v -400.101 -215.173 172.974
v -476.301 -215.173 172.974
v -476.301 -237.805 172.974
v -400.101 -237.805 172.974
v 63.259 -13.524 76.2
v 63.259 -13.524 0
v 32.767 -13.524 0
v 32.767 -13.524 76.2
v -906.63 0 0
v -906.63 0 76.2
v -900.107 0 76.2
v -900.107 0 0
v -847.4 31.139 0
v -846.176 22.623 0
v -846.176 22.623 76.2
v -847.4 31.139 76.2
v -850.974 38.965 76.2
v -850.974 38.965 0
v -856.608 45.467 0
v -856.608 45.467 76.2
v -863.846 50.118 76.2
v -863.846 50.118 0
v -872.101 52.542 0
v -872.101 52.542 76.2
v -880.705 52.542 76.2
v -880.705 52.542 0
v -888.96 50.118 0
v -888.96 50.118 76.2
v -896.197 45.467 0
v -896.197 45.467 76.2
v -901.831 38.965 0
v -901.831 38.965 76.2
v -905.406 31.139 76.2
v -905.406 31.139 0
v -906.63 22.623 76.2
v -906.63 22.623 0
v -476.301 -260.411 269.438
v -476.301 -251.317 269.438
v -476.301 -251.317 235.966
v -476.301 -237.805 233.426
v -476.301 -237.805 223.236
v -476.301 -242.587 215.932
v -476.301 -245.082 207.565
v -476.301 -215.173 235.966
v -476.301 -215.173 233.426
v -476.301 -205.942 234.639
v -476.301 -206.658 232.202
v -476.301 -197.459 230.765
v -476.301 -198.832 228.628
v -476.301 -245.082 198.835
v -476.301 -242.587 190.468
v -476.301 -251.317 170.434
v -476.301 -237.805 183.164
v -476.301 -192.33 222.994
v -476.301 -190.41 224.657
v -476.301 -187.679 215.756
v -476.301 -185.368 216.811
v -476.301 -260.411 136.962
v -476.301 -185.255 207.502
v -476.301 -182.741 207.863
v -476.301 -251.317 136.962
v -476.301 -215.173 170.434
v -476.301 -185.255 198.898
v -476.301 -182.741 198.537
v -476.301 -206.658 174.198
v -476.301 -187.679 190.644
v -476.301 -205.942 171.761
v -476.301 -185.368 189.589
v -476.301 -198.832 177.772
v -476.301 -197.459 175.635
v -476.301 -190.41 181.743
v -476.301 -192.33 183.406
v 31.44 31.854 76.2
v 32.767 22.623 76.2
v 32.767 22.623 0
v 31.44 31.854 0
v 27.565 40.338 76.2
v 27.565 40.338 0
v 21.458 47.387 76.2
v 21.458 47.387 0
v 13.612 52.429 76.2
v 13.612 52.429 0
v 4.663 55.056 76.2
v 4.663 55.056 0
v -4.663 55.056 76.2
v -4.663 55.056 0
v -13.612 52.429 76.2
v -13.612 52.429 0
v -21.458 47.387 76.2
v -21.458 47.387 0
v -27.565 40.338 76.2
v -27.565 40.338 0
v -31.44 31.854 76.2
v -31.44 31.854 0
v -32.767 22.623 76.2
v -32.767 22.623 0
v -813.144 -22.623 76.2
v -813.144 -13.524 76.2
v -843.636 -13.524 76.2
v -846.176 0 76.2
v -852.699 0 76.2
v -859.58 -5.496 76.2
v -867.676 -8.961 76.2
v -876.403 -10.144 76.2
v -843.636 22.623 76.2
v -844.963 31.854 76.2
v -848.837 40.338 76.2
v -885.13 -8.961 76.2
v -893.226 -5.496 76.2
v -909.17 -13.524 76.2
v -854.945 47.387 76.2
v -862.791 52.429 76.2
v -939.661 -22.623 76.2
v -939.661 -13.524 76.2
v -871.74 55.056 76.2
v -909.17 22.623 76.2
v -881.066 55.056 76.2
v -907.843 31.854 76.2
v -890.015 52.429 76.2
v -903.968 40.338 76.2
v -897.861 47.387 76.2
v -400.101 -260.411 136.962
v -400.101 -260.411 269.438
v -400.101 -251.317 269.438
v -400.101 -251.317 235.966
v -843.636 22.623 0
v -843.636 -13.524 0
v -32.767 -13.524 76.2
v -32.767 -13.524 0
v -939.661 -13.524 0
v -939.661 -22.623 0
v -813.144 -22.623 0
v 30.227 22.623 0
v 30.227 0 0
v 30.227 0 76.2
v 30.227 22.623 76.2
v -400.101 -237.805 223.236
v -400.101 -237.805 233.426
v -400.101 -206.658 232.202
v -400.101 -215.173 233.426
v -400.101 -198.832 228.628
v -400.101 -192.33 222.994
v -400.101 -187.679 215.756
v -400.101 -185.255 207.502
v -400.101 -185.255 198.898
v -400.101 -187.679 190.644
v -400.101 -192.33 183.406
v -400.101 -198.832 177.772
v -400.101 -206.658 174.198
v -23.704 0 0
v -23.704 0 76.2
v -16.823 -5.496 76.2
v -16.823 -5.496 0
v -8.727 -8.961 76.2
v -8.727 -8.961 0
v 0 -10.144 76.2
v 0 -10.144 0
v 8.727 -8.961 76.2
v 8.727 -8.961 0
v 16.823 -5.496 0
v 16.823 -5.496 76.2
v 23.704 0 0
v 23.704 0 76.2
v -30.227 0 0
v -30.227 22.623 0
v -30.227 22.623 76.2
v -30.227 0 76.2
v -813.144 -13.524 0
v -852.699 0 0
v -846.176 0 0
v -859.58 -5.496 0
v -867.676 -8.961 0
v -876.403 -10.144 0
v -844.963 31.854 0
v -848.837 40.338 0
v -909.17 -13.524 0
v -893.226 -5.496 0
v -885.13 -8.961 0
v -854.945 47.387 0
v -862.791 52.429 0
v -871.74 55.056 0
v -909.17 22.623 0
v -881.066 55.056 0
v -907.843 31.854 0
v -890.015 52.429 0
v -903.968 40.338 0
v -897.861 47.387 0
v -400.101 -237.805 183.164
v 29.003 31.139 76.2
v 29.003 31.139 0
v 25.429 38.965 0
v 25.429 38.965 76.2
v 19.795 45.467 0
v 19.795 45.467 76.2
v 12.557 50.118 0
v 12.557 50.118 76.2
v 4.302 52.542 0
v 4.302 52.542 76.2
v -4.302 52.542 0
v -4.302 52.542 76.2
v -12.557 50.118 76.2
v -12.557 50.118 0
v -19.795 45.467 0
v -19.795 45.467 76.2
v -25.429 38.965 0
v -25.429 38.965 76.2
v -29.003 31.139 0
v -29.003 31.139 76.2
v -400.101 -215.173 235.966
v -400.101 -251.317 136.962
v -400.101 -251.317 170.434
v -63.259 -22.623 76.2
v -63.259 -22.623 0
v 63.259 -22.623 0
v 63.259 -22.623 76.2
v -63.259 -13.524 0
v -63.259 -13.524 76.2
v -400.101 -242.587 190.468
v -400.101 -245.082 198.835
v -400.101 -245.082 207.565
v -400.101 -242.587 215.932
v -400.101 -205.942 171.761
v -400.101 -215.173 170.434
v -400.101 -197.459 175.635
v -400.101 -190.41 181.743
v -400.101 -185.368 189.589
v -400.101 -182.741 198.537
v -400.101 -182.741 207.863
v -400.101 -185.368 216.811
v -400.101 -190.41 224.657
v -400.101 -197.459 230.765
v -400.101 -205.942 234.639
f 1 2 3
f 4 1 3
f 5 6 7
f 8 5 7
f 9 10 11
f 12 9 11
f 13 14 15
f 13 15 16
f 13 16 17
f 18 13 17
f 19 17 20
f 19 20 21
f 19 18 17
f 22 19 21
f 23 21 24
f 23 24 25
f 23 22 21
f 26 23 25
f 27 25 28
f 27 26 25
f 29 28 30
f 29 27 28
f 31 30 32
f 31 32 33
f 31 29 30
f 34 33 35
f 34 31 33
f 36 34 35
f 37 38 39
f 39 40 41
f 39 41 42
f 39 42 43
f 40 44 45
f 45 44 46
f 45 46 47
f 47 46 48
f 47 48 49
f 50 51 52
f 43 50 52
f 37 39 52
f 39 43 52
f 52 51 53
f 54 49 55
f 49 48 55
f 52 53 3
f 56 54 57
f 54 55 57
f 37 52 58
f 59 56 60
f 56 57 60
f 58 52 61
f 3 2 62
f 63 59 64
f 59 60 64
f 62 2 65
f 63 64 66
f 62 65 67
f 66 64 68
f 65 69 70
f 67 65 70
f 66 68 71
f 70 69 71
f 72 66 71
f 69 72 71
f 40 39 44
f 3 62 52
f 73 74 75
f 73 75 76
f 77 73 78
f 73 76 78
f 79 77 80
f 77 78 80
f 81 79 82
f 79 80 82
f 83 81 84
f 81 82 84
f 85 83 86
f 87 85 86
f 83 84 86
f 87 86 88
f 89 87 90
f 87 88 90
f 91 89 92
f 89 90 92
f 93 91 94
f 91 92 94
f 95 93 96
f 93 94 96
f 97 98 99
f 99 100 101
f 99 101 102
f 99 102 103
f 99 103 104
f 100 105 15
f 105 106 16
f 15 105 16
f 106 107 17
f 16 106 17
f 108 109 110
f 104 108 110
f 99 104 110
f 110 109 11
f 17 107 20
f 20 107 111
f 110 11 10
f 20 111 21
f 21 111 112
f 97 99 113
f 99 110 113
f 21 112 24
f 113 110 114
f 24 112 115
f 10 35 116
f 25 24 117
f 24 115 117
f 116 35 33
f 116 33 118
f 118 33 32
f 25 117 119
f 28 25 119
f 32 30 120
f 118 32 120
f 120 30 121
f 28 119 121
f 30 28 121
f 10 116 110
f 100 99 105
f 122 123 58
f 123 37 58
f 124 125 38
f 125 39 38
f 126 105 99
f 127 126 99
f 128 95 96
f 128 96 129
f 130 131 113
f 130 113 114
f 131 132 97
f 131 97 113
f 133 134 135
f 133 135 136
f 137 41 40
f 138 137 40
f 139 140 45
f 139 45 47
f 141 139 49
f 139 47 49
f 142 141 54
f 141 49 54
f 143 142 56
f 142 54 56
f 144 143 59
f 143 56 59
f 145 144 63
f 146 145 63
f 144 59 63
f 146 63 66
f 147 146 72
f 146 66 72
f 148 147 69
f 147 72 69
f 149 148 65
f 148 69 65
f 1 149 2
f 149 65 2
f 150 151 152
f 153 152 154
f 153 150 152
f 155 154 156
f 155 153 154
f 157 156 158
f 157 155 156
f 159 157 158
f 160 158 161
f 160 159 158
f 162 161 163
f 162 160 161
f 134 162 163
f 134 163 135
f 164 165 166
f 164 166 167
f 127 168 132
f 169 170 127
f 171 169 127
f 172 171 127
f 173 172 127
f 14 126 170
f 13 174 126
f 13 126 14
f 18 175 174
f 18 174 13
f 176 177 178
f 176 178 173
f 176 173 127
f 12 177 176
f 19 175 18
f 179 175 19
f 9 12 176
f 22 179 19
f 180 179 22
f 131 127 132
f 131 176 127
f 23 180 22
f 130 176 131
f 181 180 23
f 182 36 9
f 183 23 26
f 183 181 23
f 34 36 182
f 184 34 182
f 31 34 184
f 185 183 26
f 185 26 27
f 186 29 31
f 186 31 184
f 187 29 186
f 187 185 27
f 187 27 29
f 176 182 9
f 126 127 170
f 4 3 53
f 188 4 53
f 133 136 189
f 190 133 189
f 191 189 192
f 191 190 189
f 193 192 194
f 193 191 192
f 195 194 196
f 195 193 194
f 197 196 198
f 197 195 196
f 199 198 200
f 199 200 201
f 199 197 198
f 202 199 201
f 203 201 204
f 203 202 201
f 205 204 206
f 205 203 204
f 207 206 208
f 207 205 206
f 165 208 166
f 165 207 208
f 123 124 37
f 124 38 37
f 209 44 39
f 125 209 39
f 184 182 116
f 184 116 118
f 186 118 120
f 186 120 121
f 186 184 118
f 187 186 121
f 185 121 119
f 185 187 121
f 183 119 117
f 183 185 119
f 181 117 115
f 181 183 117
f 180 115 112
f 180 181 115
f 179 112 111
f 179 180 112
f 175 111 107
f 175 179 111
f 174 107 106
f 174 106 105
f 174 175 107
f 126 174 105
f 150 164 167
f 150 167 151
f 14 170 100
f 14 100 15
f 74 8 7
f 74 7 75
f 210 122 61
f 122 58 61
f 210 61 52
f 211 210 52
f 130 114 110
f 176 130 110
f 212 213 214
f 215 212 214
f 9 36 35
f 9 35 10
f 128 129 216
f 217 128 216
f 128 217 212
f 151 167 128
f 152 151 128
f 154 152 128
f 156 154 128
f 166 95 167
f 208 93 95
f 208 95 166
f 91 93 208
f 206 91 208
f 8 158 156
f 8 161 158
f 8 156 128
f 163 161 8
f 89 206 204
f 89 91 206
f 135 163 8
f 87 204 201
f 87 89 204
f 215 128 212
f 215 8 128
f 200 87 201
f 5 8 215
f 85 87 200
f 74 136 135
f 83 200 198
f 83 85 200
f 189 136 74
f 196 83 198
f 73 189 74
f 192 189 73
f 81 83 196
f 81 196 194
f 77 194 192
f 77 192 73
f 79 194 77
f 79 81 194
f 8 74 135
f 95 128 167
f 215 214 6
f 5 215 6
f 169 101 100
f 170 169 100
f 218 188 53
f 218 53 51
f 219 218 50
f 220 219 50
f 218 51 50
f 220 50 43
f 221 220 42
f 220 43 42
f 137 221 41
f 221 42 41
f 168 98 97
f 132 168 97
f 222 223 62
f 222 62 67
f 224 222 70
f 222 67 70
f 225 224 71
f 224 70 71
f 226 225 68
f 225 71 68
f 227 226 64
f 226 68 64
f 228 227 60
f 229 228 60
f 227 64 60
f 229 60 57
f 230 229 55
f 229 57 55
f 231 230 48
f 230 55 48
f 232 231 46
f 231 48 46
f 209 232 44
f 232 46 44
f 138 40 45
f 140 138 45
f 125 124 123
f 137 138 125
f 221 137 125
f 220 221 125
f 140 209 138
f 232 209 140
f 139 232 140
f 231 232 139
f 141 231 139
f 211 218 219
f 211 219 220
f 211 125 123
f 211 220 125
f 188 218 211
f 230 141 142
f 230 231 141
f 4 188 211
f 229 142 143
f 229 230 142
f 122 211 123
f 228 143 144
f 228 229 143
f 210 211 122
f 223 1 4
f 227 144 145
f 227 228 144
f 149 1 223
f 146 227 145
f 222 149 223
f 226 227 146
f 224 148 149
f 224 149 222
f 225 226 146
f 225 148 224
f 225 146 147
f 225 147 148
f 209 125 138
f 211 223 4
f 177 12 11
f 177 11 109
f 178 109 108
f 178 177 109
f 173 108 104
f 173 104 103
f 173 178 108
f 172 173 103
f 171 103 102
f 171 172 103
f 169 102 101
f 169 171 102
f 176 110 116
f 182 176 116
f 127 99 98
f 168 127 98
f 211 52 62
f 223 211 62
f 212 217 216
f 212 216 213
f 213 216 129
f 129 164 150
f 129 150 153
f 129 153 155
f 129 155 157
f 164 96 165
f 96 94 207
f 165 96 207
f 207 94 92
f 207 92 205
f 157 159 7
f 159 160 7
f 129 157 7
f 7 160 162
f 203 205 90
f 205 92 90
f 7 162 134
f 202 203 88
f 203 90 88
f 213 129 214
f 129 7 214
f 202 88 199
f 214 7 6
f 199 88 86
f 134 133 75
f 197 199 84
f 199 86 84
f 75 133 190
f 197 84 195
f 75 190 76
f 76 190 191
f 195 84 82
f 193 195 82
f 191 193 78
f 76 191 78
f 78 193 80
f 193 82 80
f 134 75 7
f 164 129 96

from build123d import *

# Parameters (mm, degrees)
EXTRUDE1_DEPTH   = 76.2
EXTRUDE1_2_DEPTH = 76.2
EXTRUDE2_DEPTH   = 38.1


with BuildPart() as part:
    # Sketch3 → Extrude1 (new body)
    with BuildSketch(Plane.XY):
        with BuildLine():
            Line((32.767111669, -22.622779043), (63.258683422, -22.622779043))
            Line((63.258683422, -22.622779043), (63.258683422, -13.524487472))
            Line((63.258683422, -13.524487472), (32.767111669, -13.524487472))
            Line((32.767111669, -13.524487472), (32.767111669, 22.622779043))
            ThreePointArc((32.767111669, 22.622779043), (0, 55.389890712), (-32.767111669, 22.622779043))
            Line((-32.767111669, 22.622779043), (-32.767111669, -13.524487472))
            Line((-32.767111669, -13.524487472), (-63.258683422, -13.524487472))
            Line((-63.258683422, -13.524487472), (-63.258683422, -22.622779043))
            Line((-63.258683422, -22.622779043), (-32.767111669, -22.622779043))
            Line((-32.767111669, -22.622779043), (32.767111669, -22.622779043))
        make_face()
        with BuildLine():
            Line((-30.227111669, 0), (-23.704292342, 0))
            ThreePointArc((-23.704292342, 0), (0, -10.144332625), (23.704292342, 0))
            Line((23.704292342, 0), (30.227111669, 0))
            Line((30.227111669, 0), (30.227111669, 22.622779043))
            ThreePointArc((30.227111669, 22.622779043), (0, 52.849890712), (-30.227111669, 22.622779043))
            Line((-30.227111669, 22.622779043), (-30.227111669, 0))
        make_face(mode=Mode.SUBTRACT)
    extrude(amount=EXTRUDE1_DEPTH)


with BuildPart() as body_2:
    # Sketch3 → Extrude1 2 (new body)
    with BuildSketch(Plane.XY):
        with BuildLine():
            Line((-909.169911587, -22.622779043), (-939.661483341, -22.622779043))
            Line((-939.661483341, -22.622779043), (-939.661483341, -13.524487472))
            Line((-939.661483341, -13.524487472), (-909.169911587, -13.524487472))
            Line((-909.169911587, -13.524487472), (-909.169911587, 22.622779043))
            ThreePointArc((-909.169911587, 22.622779043), (-876.402799918, 55.389890712), (-843.63568825, 22.622779043))
            Line((-843.63568825, 22.622779043), (-843.63568825, -13.524487472))
            Line((-843.63568825, -13.524487472), (-813.144116496, -13.524487472))
            Line((-813.144116496, -13.524487472), (-813.144116496, -22.622779043))
            Line((-813.144116496, -22.622779043), (-843.63568825, -22.622779043))
            Line((-843.63568825, -22.622779043), (-909.169911587, -22.622779043))
        make_face()
        with BuildLine():
            Line((-852.698507576, 0), (-846.17568825, 0))
            Line((-846.17568825, 0), (-846.17568825, 22.622779043))
            ThreePointArc((-846.17568825, 22.622779043), (-876.402799918, 52.849890712), (-906.629911587, 22.622779043))
            Line((-906.629911587, 22.622779043), (-906.629911587, 0))
            Line((-906.629911587, 0), (-900.107092261, 0))
            ThreePointArc((-900.107092261, 0), (-876.402799918, -10.144332625), (-852.698507576, 0))
        make_face(mode=Mode.SUBTRACT)
    extrude(amount=EXTRUDE1_2_DEPTH)


with BuildPart() as body_3:
    # Sketch4 → Extrude2 (new, symmetric)
    with BuildSketch(Plane.ZY.offset(438.201399959)):
        with BuildLine():
            Line((235.966, -215.173168973), (235.966, -237.804568973))
            Line((235.966, -237.804568973), (235.966, -251.317368973))
            Line((235.966, -251.317368973), (269.437597768, -251.317368973))
            Line((269.437597768, -251.317368973), (269.437597768, -260.410568973))
            Line((269.437597768, -260.410568973), (136.962402232, -260.410568973))
            Line((136.962402232, -260.410568973), (136.962402232, -251.317368973))
            Line((136.962402232, -251.317368973), (170.434, -251.317368973))
            Line((170.434, -251.317368973), (170.434, -237.804568973))
            Line((170.434, -237.804568973), (170.434, -215.173168973))
            ThreePointArc((170.434, -215.173168973), (203.2, -182.407168973), (235.966, -215.173168973))
        make_face()
        with BuildLine():
            ThreePointArc((183.16426168, -237.804568973), (203.2, -245.399168973), (223.23573832, -237.804568973))
            Line((223.23573832, -237.804568973), (233.426, -237.804568973))
            Line((233.426, -237.804568973), (233.426, -215.173168973))
            ThreePointArc((233.426, -215.173168973), (203.2, -184.947168973), (172.974, -215.173168973))
            Line((172.974, -215.173168973), (172.974, -237.804568973))
            Line((172.974, -237.804568973), (183.16426168, -237.804568973))
        make_face(mode=Mode.SUBTRACT)
    extrude(amount=EXTRUDE2_DEPTH, both=True)


solid = Compound([part.part, body_2.part, body_3.part])
